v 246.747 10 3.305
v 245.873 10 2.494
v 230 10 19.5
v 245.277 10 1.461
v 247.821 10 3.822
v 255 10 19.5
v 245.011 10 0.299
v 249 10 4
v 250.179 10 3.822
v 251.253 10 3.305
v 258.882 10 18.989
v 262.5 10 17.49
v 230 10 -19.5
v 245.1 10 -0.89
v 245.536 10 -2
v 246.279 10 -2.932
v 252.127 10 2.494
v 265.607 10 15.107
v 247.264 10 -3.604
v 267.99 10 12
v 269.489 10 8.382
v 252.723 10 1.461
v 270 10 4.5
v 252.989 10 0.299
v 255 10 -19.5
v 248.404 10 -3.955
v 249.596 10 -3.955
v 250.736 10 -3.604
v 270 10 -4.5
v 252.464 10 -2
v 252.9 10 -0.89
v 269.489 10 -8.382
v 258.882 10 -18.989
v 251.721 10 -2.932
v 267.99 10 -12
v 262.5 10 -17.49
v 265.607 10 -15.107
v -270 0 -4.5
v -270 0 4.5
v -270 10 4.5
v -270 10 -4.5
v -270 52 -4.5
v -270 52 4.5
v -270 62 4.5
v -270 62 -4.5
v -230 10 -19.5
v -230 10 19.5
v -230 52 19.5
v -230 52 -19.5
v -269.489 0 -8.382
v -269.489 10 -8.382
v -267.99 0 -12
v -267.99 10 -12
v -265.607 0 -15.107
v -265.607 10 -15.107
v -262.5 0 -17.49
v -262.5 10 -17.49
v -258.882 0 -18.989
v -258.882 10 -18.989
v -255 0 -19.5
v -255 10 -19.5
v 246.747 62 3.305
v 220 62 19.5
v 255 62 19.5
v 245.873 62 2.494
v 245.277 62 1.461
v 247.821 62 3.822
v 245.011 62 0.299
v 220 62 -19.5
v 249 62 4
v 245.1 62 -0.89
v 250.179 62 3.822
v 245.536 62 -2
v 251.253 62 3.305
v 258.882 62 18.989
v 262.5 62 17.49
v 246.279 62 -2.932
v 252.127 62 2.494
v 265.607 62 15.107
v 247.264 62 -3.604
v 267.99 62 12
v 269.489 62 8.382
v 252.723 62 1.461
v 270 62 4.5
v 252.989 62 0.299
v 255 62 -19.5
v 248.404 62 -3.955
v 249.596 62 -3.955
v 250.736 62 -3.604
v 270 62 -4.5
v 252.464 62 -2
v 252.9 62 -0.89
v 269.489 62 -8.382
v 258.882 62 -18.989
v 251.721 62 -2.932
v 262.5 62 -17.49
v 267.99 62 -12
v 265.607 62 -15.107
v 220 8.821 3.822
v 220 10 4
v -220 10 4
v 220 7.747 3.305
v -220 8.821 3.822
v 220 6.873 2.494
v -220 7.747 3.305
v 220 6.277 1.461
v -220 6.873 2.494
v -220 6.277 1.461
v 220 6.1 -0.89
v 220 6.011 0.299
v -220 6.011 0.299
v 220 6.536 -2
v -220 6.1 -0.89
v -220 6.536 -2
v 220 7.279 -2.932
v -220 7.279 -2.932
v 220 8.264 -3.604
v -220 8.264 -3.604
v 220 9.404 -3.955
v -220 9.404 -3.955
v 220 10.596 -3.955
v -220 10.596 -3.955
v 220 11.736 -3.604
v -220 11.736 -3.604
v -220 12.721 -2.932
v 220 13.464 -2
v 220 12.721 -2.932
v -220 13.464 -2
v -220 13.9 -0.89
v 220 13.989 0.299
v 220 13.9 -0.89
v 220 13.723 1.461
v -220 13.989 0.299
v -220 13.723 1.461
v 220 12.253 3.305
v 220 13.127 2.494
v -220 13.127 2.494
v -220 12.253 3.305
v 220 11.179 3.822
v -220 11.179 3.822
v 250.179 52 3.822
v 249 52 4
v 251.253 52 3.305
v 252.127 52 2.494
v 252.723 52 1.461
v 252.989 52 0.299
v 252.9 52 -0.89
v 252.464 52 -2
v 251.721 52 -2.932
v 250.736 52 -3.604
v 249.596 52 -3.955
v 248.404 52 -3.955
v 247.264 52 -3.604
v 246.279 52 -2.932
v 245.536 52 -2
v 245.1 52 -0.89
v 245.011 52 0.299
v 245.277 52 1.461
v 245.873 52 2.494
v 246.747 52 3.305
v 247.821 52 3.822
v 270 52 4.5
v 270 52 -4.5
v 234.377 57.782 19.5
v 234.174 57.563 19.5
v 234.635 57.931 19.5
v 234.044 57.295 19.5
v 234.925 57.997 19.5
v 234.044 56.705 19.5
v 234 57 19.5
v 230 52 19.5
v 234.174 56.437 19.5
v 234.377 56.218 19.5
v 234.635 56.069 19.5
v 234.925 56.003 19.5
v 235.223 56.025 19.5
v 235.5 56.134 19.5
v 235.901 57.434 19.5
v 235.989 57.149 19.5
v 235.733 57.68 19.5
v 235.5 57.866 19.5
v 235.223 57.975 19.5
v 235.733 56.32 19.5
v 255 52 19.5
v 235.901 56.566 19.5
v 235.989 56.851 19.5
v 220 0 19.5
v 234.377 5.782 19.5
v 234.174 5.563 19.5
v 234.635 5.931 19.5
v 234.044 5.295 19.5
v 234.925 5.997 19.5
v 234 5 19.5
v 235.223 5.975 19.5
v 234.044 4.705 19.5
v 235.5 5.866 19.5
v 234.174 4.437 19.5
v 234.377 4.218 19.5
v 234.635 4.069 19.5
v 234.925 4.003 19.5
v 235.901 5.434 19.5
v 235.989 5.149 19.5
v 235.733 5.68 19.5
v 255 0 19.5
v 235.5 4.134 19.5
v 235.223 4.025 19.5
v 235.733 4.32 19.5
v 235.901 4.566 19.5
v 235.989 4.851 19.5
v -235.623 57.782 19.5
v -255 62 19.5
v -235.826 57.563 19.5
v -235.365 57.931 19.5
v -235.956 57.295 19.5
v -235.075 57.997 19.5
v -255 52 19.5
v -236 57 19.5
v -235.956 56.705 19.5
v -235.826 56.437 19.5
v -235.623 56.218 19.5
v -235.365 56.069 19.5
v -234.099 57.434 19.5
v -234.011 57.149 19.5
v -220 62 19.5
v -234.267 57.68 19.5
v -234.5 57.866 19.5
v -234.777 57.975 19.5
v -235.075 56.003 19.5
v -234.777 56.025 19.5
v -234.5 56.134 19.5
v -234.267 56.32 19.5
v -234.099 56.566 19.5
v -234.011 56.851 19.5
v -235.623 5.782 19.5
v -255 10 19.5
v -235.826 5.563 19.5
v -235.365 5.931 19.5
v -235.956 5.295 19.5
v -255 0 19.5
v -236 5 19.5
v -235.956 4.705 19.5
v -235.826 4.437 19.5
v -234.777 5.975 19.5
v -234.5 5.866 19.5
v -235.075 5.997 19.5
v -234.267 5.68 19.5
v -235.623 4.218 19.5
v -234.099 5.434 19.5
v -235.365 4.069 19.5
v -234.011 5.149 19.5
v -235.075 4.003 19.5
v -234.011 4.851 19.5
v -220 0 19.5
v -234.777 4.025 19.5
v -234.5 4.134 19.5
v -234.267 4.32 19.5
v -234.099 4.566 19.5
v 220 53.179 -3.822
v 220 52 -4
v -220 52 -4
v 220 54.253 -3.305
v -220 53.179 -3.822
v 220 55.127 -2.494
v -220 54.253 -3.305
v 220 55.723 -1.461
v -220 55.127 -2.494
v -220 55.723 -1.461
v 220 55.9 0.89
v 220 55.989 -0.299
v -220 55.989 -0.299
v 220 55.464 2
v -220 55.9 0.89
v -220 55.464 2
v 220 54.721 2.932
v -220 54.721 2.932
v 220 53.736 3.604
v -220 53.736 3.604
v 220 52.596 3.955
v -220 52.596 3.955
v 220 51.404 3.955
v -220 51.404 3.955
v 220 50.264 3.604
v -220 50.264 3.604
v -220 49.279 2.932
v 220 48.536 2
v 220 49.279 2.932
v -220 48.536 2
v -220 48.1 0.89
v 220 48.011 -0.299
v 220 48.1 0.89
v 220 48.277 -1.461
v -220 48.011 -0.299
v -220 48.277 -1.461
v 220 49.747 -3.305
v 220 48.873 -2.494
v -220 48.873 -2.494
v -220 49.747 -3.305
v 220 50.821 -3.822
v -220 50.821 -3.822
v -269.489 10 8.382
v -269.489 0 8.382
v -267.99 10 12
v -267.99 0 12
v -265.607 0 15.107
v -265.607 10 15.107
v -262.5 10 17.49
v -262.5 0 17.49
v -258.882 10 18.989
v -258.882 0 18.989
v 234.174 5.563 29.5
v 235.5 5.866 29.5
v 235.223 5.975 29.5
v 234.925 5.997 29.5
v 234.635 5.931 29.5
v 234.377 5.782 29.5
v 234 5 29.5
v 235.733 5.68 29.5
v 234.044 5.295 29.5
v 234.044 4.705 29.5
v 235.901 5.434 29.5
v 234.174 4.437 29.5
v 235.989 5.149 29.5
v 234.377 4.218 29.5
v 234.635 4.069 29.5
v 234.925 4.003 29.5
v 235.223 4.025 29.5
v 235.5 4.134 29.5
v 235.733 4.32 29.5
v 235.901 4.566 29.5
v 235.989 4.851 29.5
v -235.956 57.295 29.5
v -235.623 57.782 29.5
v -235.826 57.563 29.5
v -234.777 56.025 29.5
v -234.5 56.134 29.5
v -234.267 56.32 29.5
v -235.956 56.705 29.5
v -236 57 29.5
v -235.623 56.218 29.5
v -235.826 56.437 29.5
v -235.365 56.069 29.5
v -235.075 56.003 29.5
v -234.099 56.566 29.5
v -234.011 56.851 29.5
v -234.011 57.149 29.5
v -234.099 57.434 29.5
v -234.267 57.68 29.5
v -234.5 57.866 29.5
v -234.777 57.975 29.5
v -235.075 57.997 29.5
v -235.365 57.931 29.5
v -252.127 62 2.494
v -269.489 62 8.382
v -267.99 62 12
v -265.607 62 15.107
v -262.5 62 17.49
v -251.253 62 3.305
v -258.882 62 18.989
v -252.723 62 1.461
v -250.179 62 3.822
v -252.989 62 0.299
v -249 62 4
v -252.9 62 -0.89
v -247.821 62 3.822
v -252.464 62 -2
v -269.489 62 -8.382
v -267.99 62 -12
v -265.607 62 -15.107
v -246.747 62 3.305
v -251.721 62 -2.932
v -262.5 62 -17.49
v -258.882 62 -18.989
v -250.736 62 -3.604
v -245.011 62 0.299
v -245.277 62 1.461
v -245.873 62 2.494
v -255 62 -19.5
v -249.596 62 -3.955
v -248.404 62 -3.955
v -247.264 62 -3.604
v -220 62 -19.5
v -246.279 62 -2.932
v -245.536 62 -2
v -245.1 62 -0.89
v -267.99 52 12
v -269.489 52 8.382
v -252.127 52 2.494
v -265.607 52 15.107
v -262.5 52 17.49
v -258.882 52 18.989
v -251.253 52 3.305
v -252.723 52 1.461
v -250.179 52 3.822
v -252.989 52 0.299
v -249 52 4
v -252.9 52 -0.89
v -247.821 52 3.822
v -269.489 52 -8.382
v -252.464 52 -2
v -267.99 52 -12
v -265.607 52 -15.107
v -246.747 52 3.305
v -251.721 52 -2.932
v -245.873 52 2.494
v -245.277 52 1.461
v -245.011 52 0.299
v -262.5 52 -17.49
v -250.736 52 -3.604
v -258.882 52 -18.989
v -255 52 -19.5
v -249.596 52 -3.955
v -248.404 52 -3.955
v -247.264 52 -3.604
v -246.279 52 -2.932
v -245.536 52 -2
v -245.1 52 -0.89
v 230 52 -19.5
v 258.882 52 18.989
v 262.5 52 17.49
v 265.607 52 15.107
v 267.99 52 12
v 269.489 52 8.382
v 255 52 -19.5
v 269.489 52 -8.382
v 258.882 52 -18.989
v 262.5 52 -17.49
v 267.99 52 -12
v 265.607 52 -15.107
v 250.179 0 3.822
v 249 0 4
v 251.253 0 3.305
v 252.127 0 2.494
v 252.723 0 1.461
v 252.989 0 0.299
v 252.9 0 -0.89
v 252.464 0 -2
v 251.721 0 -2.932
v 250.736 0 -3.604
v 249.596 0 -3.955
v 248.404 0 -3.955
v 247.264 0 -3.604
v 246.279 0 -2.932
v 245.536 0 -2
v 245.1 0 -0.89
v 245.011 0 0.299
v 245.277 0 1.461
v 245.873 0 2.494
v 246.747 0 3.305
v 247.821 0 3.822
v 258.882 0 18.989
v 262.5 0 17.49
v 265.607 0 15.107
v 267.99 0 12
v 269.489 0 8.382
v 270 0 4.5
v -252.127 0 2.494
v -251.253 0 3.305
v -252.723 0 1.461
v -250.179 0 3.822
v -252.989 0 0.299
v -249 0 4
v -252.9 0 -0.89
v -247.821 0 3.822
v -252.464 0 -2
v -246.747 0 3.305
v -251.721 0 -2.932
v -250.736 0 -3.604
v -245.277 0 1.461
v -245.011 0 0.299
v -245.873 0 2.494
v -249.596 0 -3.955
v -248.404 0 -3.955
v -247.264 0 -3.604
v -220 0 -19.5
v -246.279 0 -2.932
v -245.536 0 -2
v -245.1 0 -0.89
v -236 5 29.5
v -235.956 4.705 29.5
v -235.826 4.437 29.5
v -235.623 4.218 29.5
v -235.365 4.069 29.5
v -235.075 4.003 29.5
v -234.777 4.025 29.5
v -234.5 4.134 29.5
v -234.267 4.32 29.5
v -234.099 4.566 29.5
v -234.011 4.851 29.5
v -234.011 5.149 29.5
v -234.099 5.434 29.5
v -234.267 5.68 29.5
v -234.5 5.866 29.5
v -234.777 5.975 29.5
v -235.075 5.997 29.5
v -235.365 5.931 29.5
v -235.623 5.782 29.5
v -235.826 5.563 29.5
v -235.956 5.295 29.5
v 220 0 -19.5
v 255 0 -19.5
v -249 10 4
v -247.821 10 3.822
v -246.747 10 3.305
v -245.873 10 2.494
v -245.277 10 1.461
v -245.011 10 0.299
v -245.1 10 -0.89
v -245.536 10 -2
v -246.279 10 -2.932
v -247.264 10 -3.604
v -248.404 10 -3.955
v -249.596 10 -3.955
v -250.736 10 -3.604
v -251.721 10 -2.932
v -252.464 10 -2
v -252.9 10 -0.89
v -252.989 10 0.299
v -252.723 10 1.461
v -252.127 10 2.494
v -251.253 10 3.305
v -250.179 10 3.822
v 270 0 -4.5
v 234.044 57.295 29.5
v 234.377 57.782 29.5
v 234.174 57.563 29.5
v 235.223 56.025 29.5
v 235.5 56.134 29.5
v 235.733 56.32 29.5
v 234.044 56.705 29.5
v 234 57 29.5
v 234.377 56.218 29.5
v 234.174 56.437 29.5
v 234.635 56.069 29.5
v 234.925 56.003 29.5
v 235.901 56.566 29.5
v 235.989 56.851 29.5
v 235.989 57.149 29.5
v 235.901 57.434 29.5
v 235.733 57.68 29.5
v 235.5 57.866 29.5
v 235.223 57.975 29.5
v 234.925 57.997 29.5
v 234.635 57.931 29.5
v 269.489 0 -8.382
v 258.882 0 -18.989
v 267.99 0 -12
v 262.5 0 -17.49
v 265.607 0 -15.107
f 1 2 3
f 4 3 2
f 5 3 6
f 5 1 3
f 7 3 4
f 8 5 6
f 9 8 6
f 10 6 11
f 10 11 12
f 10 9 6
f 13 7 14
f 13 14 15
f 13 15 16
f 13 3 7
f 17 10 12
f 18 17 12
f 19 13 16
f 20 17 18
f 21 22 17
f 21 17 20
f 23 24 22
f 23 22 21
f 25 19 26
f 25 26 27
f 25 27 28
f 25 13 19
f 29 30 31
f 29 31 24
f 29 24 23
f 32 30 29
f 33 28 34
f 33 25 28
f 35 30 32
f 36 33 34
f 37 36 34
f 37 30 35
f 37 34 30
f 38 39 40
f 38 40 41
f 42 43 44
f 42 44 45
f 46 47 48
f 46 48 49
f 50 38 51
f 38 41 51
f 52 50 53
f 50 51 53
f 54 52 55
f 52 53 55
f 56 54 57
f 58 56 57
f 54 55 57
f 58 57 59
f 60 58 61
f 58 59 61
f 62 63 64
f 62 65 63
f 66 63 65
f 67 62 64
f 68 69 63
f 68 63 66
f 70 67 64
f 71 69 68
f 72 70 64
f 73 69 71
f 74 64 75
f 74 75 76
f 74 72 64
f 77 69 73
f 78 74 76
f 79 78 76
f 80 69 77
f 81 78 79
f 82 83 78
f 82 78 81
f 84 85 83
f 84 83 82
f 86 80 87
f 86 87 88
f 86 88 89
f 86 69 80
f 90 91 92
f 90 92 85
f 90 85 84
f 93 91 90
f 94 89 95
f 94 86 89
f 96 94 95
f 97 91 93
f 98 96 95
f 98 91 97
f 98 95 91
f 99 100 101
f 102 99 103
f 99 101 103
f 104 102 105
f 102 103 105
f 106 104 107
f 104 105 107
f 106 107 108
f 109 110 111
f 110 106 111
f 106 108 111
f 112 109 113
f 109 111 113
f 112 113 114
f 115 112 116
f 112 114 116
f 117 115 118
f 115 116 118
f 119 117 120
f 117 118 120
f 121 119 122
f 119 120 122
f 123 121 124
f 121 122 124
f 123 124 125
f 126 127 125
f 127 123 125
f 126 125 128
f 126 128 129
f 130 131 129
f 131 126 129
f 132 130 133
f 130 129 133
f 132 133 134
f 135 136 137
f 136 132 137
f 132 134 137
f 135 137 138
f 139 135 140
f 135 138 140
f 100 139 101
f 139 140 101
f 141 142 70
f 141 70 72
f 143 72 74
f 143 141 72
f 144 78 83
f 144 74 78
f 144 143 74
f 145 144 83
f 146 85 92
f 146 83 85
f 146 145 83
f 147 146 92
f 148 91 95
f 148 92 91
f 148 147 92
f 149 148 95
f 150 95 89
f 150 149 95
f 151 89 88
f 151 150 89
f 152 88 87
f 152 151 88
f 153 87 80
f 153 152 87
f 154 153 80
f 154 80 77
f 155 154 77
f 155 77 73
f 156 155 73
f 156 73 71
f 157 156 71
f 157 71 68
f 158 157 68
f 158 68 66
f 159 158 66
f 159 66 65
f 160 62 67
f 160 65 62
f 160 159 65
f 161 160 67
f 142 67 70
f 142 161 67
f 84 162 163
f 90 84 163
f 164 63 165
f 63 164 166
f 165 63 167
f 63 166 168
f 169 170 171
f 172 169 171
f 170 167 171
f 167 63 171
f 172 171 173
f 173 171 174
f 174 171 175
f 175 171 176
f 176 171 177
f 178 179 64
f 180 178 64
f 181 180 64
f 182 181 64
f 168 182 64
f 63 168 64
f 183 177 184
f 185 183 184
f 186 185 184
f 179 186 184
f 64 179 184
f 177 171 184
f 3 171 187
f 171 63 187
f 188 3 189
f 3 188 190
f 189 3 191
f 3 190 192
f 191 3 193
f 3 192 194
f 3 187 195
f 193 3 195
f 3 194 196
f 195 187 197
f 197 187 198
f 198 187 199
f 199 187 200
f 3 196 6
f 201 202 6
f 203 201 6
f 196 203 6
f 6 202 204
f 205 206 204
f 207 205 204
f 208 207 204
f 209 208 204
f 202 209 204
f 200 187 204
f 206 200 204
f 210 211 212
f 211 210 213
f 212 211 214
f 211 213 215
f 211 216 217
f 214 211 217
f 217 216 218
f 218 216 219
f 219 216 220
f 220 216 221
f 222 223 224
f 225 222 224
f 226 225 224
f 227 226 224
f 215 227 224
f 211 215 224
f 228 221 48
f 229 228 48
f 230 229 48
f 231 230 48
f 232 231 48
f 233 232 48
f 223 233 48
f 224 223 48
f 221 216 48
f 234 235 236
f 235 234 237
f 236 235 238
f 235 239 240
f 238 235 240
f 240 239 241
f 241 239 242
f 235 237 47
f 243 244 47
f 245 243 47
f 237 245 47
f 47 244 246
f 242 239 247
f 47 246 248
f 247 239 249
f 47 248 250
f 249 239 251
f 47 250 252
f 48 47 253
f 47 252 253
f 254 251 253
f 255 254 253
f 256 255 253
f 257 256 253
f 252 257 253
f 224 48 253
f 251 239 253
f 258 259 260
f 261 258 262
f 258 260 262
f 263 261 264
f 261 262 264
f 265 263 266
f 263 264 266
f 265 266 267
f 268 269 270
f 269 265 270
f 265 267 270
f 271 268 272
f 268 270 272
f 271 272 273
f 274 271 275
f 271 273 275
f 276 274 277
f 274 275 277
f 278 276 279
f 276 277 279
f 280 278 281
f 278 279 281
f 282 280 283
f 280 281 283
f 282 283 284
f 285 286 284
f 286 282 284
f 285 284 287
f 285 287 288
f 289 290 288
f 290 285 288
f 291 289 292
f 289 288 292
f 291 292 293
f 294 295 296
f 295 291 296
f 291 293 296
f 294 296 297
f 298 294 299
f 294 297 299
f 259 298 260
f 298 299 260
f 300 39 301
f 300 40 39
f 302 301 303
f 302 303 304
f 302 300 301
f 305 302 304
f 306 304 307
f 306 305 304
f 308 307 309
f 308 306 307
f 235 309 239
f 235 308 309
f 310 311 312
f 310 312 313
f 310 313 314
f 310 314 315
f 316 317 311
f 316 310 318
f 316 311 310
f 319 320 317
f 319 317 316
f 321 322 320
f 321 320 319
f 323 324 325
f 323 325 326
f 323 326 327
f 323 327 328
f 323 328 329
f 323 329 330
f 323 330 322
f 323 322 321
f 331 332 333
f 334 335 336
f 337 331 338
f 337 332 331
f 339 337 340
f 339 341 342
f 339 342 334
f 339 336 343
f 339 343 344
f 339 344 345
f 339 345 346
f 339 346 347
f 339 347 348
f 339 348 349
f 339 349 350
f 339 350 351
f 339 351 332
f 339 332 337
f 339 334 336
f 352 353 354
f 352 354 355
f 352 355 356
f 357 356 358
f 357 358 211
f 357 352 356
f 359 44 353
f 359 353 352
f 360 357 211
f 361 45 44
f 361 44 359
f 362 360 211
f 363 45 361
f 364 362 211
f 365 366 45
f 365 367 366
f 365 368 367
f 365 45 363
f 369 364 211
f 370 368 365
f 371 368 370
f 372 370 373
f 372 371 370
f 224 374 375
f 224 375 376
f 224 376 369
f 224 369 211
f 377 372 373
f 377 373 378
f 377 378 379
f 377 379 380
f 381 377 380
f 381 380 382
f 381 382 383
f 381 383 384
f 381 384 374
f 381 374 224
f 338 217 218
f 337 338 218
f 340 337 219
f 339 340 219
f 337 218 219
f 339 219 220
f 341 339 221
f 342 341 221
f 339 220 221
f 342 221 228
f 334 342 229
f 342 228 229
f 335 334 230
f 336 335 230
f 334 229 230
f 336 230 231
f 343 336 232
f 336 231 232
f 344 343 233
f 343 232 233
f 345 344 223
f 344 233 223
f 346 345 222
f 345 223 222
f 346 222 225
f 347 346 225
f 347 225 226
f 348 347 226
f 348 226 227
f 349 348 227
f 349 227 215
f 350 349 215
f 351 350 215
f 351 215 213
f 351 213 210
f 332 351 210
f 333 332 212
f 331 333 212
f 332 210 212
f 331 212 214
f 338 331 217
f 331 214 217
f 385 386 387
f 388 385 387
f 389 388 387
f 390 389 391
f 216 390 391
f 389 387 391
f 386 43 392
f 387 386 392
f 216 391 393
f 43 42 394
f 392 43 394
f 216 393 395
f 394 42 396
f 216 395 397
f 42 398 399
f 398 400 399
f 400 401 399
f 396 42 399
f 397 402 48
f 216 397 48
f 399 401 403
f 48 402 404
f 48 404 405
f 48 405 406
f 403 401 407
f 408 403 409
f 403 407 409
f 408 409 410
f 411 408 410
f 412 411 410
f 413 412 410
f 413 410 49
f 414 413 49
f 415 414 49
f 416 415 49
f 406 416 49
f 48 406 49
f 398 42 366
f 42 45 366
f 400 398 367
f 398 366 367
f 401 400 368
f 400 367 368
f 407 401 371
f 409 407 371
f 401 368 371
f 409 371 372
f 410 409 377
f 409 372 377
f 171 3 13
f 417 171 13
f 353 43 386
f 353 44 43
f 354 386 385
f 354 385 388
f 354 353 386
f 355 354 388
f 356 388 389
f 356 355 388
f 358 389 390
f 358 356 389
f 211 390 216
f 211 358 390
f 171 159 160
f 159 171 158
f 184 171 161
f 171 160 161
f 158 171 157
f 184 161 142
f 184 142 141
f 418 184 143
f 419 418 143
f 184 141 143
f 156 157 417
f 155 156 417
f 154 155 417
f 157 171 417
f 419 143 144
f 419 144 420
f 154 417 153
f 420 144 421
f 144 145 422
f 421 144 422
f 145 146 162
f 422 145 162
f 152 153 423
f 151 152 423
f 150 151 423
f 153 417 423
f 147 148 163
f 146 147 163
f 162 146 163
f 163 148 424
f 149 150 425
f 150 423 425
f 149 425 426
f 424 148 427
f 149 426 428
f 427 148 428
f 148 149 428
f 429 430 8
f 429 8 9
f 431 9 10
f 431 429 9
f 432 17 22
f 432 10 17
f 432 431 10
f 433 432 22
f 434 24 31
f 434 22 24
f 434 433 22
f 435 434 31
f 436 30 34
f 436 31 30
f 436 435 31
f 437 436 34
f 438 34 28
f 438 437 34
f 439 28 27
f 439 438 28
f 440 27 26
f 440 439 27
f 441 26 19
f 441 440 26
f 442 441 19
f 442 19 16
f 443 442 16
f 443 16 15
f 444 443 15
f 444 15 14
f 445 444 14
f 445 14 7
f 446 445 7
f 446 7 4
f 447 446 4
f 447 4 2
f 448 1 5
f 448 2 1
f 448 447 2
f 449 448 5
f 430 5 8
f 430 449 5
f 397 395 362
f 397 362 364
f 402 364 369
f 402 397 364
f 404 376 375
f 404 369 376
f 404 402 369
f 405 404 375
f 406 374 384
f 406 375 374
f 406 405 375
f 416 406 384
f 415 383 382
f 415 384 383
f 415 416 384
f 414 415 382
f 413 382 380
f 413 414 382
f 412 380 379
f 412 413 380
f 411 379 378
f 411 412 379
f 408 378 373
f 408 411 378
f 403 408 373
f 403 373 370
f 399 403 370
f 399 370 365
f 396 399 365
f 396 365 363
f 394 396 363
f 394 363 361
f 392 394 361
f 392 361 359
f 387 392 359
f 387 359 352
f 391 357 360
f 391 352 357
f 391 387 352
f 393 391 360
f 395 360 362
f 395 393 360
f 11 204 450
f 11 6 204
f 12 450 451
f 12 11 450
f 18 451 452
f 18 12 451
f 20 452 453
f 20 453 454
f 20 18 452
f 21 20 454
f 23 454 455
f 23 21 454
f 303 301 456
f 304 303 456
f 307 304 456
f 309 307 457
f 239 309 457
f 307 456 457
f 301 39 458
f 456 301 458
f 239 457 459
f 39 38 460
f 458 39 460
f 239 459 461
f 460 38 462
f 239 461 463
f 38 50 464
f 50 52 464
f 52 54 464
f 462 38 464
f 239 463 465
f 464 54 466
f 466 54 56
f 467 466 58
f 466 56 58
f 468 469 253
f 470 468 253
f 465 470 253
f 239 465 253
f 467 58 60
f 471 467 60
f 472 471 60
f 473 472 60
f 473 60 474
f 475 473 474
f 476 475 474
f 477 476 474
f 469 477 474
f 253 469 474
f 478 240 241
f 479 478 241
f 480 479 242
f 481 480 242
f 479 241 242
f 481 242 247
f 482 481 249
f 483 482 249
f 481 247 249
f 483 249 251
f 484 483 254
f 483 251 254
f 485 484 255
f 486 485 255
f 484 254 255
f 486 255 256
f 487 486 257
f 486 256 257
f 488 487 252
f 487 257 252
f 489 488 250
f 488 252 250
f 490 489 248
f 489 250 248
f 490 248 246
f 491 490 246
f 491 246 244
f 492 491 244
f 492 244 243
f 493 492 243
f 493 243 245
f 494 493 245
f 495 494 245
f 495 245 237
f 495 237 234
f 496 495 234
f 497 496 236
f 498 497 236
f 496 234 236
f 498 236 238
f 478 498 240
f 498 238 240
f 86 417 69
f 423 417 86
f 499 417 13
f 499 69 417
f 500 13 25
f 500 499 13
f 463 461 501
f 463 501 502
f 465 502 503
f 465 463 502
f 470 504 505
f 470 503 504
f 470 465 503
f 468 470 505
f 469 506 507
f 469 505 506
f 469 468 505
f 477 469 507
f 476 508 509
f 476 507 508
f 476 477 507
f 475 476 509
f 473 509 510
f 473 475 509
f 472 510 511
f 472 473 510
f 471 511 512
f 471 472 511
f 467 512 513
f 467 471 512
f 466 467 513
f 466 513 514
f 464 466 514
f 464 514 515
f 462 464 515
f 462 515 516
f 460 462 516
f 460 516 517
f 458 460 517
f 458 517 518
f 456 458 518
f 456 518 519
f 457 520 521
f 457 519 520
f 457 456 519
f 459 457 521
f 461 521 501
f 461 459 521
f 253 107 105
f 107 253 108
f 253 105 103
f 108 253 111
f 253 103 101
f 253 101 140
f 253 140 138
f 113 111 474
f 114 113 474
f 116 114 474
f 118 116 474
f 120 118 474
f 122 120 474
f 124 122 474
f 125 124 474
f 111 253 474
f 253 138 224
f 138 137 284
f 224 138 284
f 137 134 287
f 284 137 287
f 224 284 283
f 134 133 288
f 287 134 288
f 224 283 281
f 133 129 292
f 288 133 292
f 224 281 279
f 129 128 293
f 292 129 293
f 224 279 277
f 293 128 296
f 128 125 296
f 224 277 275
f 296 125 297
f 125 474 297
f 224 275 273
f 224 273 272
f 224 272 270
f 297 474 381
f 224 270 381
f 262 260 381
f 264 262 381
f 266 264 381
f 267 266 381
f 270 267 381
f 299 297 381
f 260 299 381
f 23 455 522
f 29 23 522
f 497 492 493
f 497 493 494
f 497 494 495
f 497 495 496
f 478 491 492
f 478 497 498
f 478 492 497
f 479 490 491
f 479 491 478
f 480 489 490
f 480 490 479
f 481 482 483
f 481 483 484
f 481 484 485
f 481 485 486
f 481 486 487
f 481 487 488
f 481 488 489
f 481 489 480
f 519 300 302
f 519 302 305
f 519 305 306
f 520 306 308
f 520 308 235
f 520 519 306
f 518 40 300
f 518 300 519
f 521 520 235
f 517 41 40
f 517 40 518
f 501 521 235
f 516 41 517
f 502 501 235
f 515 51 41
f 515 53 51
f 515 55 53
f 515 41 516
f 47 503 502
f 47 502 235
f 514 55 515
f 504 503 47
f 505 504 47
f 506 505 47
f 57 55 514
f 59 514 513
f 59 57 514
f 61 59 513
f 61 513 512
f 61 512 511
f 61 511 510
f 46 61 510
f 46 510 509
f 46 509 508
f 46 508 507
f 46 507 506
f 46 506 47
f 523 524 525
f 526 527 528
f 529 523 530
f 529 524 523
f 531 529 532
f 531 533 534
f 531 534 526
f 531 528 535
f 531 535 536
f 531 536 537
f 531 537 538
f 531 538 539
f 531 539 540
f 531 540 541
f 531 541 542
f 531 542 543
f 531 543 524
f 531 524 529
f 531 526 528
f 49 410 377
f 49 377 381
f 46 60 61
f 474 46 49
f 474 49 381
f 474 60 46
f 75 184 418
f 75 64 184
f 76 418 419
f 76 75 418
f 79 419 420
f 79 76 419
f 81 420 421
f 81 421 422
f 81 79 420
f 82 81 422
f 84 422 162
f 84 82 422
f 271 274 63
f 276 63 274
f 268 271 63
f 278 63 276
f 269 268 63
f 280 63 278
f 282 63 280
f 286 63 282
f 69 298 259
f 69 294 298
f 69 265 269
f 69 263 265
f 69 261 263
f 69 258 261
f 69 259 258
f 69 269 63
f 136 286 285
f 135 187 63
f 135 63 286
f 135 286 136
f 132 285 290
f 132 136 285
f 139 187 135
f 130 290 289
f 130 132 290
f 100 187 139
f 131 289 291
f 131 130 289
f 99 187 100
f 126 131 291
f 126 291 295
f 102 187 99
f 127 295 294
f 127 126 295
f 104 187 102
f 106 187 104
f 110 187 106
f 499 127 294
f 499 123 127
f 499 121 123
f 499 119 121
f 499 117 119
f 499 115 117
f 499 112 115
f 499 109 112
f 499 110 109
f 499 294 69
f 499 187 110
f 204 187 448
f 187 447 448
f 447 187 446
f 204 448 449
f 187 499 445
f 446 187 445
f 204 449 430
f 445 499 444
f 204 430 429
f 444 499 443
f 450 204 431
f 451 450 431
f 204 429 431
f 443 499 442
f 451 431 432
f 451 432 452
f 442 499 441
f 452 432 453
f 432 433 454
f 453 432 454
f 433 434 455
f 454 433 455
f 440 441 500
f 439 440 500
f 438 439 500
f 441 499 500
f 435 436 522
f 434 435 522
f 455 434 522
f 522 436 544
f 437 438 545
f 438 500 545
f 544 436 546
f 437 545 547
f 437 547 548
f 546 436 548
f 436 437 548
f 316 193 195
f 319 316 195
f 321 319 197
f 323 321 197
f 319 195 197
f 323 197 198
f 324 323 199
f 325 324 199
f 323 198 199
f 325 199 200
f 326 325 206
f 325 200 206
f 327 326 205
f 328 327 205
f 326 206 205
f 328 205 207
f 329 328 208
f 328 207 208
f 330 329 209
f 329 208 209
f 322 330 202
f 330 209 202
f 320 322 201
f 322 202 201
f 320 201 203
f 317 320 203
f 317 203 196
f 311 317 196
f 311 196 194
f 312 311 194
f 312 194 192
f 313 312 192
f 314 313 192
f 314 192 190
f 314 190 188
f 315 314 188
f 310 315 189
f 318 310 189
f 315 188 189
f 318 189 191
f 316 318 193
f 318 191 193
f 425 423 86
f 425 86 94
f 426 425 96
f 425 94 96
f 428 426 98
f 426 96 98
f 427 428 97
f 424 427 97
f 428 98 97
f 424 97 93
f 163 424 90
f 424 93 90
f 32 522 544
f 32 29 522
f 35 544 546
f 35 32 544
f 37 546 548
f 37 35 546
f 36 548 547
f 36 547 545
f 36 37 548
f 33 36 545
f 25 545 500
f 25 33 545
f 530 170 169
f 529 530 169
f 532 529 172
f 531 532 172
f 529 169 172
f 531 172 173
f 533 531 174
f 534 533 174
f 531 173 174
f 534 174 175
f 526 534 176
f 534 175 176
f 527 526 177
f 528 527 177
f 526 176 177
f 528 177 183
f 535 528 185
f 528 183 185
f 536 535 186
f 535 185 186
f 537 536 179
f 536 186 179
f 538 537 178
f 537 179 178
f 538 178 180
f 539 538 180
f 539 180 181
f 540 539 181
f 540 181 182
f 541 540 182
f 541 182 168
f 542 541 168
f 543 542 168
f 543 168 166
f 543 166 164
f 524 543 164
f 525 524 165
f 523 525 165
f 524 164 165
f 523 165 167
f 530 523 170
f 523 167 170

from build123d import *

# Parameters (mm, degrees)
ESQUISSE1_W                  = 540
ESQUISSE1_H                  = 39
BOSS_EXTRU_1_DEPTH           = 10
CONG_1_R                     = 15
ESQUISSE3_W                  = 10
ESQUISSE3_H                  = 39
BOSS_EXTRU_2_DEPTH           = 42
ESQUISSE4_W                  = 540
ESQUISSE4_H                  = 39
BOSS_EXTRU_3_DEPTH           = 10
CONG_2_R                     = 15
ENL_V_MAT_EXTRU_2_DEPTH      = 278.712531226
ENL_V_MAT_EXTRU_2_DEPTH_BACK = 278.712531226
ESQUISSE5_R                  = 4
ESQUISSE6_R                  = 1
BOSS_EXTRU_4_DEPTH           = 10
ENL_V_MAT_EXTRU_3_DEPTH      = 280.758824704
ENL_V_MAT_EXTRU_3_DEPTH_BACK = 280.758824704
ESQUISSE7_W                  = 440
ESQUISSE7_H                  = 10
ENL_V_MAT_EXTRU_4_DEPTH      = 277.53978014
ENL_V_MAT_EXTRU_4_DEPTH_BACK = 277.53978014
ESQUISSE13_W                 = 440
ESQUISSE13_H                 = 39
BOSS_EXTRU_6_REACH           = 496.787
ESQUISSE14_R                 = 4


with BuildPart() as part:
    # Esquisse1 → Boss.-Extru.1 (new body)
    with BuildSketch(Plane(origin=(0, 0, 0), x_dir=(1, 0, 0), z_dir=(0, 1, 0))):
        Rectangle(ESQUISSE1_W, ESQUISSE1_H)
    extrude(amount=BOSS_EXTRU_1_DEPTH)

    # Congé1
    cong_1_edges = [part.edges().sort_by_distance(p)[0] for p in [
        (270, 5, 19.5),
        (-270, 5, 19.5),
        (-270, 5, -19.5),
        (270, 5, -19.5),
    ]]
    fillet(cong_1_edges, radius=CONG_1_R)

    # Esquisse3 → Boss.-Extru.2 (add)
    with BuildSketch(Plane(origin=(0, 10, 0), x_dir=(1, 0, 0), z_dir=(0, 1, 0))):
        with Locations((-225, 0)):
            Rectangle(ESQUISSE3_W, ESQUISSE3_H)
        with Locations((225, 0)):
            Rectangle(ESQUISSE3_W, ESQUISSE3_H)
    extrude(amount=BOSS_EXTRU_2_DEPTH)

    # Esquisse4 → Boss.-Extru.3 (add)
    with BuildSketch(Plane(origin=(0, 52, 0), x_dir=(1, 0, 0), z_dir=(0, 1, 0))):
        Rectangle(ESQUISSE4_W, ESQUISSE4_H)
    extrude(amount=BOSS_EXTRU_3_DEPTH)

    # Congé2
    cong_2_edges = [part.edges().sort_by_distance(p)[0] for p in [
        (-270, 57, -19.5),
        (-270, 57, 19.5),
        (270, 57, 19.5),
        (270, 57, -19.5),
    ]]
    fillet(cong_2_edges, radius=CONG_2_R)

    # Esquisse5 → Enlèv. mat.-Extru.2 (cut, two sides: drawn at the far end of the back side and taken through both)
    with BuildSketch(Plane(origin=(0, 62, 0), x_dir=(1, 0, 0), z_dir=(0, 1, 0)).offset(-ENL_V_MAT_EXTRU_2_DEPTH_BACK)):
        with Locations(Location((249, 0, 0), (0, 0, 270))):
            Circle(ESQUISSE5_R)
        with Locations(Location((-249, 0, 0), (0, 0, 270))):
            Circle(ESQUISSE5_R)
    extrude(amount=ENL_V_MAT_EXTRU_2_DEPTH + ENL_V_MAT_EXTRU_2_DEPTH_BACK, mode=Mode.SUBTRACT)

    # Esquisse6 → Boss.-Extru.4 (add)
    with BuildSketch(Plane.XY.offset(19.5)):
        with Locations(Location((-235, 57, 0), (0, 0, 180))):
            Circle(ESQUISSE6_R)
        with Locations(Location((-235, 5, 0), (0, 0, 180))):
            Circle(ESQUISSE6_R)
        with Locations(Location((235, 5, 0), (0, 0, 180))):
            Circle(ESQUISSE6_R)
        with Locations(Location((235, 57, 0), (0, 0, 180))):
            Circle(ESQUISSE6_R)
    extrude(amount=BOSS_EXTRU_4_DEPTH)

    # Esquisse7 → Enlèv. mat.-Extru.3 (cut, two sides: drawn at the far end of the back side and taken through both)
    with BuildSketch(Plane.XY.offset(19.5).offset(-ENL_V_MAT_EXTRU_3_DEPTH_BACK)):
        with Locations((0, 57)):
            Rectangle(ESQUISSE7_W, ESQUISSE7_H)
    extrude(amount=ENL_V_MAT_EXTRU_3_DEPTH + ENL_V_MAT_EXTRU_3_DEPTH_BACK, mode=Mode.SUBTRACT)

    # Esquisse13 → Enlèv. mat.-Extru.4 (cut, two sides: drawn at the far end of the back side and taken through both)
    with BuildSketch(Plane(origin=(0, 10, 0), x_dir=(1, 0, 0), z_dir=(0, 1, 0)).offset(-ENL_V_MAT_EXTRU_4_DEPTH_BACK)):
        Rectangle(ESQUISSE13_W, ESQUISSE13_H)
    extrude(amount=ENL_V_MAT_EXTRU_4_DEPTH + ENL_V_MAT_EXTRU_4_DEPTH_BACK, mode=Mode.SUBTRACT)


with BuildPart() as enl_v_mat_extru_4_piece_1:
    # of the separate pieces the step leaves, piece 1, a body of its own (enl_v_mat_extru_4_pieces)
    add(part.part.solids().sort_by_distance((220, 0, -19.5))[0])

    # Esquisse14 → Boss.-Extru.6 (add, up to next)
    with BuildSketch(Plane(origin=(-220, 0, 0), x_dir=(0, 0, -1), z_dir=(1, 0, 0)), mode=Mode.PRIVATE) as boss_extru_6_sk1:
        with Locations((0, 52)):
            Circle(ESQUISSE14_R)
    boss_extru_6_tool1 = extrude(boss_extru_6_sk1.sketch, amount=BOSS_EXTRU_6_REACH, mode=Mode.PRIVATE) - enl_v_mat_extru_4_piece_1.part
    # Esquisse14 → Boss.-Extru.6 (add, up to next)
    with BuildSketch(Plane(origin=(-220, 0, 0), x_dir=(0, 0, -1), z_dir=(1, 0, 0)), mode=Mode.PRIVATE) as boss_extru_6_sk2:
        with Locations(Location((0, 10, 0), (0, 0, 180))):
            Circle(ESQUISSE14_R)
    boss_extru_6_tool2 = extrude(boss_extru_6_sk2.sketch, amount=BOSS_EXTRU_6_REACH, mode=Mode.PRIVATE) - enl_v_mat_extru_4_piece_1.part


with BuildPart() as enl_v_mat_extru_4_piece_2:
    # of the separate pieces the step leaves, piece 2, a body of its own (enl_v_mat_extru_4_pieces)
    add(part.part.solids().sort_by_distance((-255, 52, -19.5))[0])


with BuildPart() as enl_v_mat_extru_4_piece_1_1:
    add(enl_v_mat_extru_4_piece_1.part)

    add(enl_v_mat_extru_4_piece_2.part)  # Boss.-Extru.6 merges Enlèv. mat.-Extru.4 piece 2
    add(boss_extru_6_tool1.solids().sort_by_distance((-220, 52, 0))[0])
    add(boss_extru_6_tool2.solids().sort_by_distance((-220, 10, 0))[0])


solid = enl_v_mat_extru_4_piece_1_1.part
